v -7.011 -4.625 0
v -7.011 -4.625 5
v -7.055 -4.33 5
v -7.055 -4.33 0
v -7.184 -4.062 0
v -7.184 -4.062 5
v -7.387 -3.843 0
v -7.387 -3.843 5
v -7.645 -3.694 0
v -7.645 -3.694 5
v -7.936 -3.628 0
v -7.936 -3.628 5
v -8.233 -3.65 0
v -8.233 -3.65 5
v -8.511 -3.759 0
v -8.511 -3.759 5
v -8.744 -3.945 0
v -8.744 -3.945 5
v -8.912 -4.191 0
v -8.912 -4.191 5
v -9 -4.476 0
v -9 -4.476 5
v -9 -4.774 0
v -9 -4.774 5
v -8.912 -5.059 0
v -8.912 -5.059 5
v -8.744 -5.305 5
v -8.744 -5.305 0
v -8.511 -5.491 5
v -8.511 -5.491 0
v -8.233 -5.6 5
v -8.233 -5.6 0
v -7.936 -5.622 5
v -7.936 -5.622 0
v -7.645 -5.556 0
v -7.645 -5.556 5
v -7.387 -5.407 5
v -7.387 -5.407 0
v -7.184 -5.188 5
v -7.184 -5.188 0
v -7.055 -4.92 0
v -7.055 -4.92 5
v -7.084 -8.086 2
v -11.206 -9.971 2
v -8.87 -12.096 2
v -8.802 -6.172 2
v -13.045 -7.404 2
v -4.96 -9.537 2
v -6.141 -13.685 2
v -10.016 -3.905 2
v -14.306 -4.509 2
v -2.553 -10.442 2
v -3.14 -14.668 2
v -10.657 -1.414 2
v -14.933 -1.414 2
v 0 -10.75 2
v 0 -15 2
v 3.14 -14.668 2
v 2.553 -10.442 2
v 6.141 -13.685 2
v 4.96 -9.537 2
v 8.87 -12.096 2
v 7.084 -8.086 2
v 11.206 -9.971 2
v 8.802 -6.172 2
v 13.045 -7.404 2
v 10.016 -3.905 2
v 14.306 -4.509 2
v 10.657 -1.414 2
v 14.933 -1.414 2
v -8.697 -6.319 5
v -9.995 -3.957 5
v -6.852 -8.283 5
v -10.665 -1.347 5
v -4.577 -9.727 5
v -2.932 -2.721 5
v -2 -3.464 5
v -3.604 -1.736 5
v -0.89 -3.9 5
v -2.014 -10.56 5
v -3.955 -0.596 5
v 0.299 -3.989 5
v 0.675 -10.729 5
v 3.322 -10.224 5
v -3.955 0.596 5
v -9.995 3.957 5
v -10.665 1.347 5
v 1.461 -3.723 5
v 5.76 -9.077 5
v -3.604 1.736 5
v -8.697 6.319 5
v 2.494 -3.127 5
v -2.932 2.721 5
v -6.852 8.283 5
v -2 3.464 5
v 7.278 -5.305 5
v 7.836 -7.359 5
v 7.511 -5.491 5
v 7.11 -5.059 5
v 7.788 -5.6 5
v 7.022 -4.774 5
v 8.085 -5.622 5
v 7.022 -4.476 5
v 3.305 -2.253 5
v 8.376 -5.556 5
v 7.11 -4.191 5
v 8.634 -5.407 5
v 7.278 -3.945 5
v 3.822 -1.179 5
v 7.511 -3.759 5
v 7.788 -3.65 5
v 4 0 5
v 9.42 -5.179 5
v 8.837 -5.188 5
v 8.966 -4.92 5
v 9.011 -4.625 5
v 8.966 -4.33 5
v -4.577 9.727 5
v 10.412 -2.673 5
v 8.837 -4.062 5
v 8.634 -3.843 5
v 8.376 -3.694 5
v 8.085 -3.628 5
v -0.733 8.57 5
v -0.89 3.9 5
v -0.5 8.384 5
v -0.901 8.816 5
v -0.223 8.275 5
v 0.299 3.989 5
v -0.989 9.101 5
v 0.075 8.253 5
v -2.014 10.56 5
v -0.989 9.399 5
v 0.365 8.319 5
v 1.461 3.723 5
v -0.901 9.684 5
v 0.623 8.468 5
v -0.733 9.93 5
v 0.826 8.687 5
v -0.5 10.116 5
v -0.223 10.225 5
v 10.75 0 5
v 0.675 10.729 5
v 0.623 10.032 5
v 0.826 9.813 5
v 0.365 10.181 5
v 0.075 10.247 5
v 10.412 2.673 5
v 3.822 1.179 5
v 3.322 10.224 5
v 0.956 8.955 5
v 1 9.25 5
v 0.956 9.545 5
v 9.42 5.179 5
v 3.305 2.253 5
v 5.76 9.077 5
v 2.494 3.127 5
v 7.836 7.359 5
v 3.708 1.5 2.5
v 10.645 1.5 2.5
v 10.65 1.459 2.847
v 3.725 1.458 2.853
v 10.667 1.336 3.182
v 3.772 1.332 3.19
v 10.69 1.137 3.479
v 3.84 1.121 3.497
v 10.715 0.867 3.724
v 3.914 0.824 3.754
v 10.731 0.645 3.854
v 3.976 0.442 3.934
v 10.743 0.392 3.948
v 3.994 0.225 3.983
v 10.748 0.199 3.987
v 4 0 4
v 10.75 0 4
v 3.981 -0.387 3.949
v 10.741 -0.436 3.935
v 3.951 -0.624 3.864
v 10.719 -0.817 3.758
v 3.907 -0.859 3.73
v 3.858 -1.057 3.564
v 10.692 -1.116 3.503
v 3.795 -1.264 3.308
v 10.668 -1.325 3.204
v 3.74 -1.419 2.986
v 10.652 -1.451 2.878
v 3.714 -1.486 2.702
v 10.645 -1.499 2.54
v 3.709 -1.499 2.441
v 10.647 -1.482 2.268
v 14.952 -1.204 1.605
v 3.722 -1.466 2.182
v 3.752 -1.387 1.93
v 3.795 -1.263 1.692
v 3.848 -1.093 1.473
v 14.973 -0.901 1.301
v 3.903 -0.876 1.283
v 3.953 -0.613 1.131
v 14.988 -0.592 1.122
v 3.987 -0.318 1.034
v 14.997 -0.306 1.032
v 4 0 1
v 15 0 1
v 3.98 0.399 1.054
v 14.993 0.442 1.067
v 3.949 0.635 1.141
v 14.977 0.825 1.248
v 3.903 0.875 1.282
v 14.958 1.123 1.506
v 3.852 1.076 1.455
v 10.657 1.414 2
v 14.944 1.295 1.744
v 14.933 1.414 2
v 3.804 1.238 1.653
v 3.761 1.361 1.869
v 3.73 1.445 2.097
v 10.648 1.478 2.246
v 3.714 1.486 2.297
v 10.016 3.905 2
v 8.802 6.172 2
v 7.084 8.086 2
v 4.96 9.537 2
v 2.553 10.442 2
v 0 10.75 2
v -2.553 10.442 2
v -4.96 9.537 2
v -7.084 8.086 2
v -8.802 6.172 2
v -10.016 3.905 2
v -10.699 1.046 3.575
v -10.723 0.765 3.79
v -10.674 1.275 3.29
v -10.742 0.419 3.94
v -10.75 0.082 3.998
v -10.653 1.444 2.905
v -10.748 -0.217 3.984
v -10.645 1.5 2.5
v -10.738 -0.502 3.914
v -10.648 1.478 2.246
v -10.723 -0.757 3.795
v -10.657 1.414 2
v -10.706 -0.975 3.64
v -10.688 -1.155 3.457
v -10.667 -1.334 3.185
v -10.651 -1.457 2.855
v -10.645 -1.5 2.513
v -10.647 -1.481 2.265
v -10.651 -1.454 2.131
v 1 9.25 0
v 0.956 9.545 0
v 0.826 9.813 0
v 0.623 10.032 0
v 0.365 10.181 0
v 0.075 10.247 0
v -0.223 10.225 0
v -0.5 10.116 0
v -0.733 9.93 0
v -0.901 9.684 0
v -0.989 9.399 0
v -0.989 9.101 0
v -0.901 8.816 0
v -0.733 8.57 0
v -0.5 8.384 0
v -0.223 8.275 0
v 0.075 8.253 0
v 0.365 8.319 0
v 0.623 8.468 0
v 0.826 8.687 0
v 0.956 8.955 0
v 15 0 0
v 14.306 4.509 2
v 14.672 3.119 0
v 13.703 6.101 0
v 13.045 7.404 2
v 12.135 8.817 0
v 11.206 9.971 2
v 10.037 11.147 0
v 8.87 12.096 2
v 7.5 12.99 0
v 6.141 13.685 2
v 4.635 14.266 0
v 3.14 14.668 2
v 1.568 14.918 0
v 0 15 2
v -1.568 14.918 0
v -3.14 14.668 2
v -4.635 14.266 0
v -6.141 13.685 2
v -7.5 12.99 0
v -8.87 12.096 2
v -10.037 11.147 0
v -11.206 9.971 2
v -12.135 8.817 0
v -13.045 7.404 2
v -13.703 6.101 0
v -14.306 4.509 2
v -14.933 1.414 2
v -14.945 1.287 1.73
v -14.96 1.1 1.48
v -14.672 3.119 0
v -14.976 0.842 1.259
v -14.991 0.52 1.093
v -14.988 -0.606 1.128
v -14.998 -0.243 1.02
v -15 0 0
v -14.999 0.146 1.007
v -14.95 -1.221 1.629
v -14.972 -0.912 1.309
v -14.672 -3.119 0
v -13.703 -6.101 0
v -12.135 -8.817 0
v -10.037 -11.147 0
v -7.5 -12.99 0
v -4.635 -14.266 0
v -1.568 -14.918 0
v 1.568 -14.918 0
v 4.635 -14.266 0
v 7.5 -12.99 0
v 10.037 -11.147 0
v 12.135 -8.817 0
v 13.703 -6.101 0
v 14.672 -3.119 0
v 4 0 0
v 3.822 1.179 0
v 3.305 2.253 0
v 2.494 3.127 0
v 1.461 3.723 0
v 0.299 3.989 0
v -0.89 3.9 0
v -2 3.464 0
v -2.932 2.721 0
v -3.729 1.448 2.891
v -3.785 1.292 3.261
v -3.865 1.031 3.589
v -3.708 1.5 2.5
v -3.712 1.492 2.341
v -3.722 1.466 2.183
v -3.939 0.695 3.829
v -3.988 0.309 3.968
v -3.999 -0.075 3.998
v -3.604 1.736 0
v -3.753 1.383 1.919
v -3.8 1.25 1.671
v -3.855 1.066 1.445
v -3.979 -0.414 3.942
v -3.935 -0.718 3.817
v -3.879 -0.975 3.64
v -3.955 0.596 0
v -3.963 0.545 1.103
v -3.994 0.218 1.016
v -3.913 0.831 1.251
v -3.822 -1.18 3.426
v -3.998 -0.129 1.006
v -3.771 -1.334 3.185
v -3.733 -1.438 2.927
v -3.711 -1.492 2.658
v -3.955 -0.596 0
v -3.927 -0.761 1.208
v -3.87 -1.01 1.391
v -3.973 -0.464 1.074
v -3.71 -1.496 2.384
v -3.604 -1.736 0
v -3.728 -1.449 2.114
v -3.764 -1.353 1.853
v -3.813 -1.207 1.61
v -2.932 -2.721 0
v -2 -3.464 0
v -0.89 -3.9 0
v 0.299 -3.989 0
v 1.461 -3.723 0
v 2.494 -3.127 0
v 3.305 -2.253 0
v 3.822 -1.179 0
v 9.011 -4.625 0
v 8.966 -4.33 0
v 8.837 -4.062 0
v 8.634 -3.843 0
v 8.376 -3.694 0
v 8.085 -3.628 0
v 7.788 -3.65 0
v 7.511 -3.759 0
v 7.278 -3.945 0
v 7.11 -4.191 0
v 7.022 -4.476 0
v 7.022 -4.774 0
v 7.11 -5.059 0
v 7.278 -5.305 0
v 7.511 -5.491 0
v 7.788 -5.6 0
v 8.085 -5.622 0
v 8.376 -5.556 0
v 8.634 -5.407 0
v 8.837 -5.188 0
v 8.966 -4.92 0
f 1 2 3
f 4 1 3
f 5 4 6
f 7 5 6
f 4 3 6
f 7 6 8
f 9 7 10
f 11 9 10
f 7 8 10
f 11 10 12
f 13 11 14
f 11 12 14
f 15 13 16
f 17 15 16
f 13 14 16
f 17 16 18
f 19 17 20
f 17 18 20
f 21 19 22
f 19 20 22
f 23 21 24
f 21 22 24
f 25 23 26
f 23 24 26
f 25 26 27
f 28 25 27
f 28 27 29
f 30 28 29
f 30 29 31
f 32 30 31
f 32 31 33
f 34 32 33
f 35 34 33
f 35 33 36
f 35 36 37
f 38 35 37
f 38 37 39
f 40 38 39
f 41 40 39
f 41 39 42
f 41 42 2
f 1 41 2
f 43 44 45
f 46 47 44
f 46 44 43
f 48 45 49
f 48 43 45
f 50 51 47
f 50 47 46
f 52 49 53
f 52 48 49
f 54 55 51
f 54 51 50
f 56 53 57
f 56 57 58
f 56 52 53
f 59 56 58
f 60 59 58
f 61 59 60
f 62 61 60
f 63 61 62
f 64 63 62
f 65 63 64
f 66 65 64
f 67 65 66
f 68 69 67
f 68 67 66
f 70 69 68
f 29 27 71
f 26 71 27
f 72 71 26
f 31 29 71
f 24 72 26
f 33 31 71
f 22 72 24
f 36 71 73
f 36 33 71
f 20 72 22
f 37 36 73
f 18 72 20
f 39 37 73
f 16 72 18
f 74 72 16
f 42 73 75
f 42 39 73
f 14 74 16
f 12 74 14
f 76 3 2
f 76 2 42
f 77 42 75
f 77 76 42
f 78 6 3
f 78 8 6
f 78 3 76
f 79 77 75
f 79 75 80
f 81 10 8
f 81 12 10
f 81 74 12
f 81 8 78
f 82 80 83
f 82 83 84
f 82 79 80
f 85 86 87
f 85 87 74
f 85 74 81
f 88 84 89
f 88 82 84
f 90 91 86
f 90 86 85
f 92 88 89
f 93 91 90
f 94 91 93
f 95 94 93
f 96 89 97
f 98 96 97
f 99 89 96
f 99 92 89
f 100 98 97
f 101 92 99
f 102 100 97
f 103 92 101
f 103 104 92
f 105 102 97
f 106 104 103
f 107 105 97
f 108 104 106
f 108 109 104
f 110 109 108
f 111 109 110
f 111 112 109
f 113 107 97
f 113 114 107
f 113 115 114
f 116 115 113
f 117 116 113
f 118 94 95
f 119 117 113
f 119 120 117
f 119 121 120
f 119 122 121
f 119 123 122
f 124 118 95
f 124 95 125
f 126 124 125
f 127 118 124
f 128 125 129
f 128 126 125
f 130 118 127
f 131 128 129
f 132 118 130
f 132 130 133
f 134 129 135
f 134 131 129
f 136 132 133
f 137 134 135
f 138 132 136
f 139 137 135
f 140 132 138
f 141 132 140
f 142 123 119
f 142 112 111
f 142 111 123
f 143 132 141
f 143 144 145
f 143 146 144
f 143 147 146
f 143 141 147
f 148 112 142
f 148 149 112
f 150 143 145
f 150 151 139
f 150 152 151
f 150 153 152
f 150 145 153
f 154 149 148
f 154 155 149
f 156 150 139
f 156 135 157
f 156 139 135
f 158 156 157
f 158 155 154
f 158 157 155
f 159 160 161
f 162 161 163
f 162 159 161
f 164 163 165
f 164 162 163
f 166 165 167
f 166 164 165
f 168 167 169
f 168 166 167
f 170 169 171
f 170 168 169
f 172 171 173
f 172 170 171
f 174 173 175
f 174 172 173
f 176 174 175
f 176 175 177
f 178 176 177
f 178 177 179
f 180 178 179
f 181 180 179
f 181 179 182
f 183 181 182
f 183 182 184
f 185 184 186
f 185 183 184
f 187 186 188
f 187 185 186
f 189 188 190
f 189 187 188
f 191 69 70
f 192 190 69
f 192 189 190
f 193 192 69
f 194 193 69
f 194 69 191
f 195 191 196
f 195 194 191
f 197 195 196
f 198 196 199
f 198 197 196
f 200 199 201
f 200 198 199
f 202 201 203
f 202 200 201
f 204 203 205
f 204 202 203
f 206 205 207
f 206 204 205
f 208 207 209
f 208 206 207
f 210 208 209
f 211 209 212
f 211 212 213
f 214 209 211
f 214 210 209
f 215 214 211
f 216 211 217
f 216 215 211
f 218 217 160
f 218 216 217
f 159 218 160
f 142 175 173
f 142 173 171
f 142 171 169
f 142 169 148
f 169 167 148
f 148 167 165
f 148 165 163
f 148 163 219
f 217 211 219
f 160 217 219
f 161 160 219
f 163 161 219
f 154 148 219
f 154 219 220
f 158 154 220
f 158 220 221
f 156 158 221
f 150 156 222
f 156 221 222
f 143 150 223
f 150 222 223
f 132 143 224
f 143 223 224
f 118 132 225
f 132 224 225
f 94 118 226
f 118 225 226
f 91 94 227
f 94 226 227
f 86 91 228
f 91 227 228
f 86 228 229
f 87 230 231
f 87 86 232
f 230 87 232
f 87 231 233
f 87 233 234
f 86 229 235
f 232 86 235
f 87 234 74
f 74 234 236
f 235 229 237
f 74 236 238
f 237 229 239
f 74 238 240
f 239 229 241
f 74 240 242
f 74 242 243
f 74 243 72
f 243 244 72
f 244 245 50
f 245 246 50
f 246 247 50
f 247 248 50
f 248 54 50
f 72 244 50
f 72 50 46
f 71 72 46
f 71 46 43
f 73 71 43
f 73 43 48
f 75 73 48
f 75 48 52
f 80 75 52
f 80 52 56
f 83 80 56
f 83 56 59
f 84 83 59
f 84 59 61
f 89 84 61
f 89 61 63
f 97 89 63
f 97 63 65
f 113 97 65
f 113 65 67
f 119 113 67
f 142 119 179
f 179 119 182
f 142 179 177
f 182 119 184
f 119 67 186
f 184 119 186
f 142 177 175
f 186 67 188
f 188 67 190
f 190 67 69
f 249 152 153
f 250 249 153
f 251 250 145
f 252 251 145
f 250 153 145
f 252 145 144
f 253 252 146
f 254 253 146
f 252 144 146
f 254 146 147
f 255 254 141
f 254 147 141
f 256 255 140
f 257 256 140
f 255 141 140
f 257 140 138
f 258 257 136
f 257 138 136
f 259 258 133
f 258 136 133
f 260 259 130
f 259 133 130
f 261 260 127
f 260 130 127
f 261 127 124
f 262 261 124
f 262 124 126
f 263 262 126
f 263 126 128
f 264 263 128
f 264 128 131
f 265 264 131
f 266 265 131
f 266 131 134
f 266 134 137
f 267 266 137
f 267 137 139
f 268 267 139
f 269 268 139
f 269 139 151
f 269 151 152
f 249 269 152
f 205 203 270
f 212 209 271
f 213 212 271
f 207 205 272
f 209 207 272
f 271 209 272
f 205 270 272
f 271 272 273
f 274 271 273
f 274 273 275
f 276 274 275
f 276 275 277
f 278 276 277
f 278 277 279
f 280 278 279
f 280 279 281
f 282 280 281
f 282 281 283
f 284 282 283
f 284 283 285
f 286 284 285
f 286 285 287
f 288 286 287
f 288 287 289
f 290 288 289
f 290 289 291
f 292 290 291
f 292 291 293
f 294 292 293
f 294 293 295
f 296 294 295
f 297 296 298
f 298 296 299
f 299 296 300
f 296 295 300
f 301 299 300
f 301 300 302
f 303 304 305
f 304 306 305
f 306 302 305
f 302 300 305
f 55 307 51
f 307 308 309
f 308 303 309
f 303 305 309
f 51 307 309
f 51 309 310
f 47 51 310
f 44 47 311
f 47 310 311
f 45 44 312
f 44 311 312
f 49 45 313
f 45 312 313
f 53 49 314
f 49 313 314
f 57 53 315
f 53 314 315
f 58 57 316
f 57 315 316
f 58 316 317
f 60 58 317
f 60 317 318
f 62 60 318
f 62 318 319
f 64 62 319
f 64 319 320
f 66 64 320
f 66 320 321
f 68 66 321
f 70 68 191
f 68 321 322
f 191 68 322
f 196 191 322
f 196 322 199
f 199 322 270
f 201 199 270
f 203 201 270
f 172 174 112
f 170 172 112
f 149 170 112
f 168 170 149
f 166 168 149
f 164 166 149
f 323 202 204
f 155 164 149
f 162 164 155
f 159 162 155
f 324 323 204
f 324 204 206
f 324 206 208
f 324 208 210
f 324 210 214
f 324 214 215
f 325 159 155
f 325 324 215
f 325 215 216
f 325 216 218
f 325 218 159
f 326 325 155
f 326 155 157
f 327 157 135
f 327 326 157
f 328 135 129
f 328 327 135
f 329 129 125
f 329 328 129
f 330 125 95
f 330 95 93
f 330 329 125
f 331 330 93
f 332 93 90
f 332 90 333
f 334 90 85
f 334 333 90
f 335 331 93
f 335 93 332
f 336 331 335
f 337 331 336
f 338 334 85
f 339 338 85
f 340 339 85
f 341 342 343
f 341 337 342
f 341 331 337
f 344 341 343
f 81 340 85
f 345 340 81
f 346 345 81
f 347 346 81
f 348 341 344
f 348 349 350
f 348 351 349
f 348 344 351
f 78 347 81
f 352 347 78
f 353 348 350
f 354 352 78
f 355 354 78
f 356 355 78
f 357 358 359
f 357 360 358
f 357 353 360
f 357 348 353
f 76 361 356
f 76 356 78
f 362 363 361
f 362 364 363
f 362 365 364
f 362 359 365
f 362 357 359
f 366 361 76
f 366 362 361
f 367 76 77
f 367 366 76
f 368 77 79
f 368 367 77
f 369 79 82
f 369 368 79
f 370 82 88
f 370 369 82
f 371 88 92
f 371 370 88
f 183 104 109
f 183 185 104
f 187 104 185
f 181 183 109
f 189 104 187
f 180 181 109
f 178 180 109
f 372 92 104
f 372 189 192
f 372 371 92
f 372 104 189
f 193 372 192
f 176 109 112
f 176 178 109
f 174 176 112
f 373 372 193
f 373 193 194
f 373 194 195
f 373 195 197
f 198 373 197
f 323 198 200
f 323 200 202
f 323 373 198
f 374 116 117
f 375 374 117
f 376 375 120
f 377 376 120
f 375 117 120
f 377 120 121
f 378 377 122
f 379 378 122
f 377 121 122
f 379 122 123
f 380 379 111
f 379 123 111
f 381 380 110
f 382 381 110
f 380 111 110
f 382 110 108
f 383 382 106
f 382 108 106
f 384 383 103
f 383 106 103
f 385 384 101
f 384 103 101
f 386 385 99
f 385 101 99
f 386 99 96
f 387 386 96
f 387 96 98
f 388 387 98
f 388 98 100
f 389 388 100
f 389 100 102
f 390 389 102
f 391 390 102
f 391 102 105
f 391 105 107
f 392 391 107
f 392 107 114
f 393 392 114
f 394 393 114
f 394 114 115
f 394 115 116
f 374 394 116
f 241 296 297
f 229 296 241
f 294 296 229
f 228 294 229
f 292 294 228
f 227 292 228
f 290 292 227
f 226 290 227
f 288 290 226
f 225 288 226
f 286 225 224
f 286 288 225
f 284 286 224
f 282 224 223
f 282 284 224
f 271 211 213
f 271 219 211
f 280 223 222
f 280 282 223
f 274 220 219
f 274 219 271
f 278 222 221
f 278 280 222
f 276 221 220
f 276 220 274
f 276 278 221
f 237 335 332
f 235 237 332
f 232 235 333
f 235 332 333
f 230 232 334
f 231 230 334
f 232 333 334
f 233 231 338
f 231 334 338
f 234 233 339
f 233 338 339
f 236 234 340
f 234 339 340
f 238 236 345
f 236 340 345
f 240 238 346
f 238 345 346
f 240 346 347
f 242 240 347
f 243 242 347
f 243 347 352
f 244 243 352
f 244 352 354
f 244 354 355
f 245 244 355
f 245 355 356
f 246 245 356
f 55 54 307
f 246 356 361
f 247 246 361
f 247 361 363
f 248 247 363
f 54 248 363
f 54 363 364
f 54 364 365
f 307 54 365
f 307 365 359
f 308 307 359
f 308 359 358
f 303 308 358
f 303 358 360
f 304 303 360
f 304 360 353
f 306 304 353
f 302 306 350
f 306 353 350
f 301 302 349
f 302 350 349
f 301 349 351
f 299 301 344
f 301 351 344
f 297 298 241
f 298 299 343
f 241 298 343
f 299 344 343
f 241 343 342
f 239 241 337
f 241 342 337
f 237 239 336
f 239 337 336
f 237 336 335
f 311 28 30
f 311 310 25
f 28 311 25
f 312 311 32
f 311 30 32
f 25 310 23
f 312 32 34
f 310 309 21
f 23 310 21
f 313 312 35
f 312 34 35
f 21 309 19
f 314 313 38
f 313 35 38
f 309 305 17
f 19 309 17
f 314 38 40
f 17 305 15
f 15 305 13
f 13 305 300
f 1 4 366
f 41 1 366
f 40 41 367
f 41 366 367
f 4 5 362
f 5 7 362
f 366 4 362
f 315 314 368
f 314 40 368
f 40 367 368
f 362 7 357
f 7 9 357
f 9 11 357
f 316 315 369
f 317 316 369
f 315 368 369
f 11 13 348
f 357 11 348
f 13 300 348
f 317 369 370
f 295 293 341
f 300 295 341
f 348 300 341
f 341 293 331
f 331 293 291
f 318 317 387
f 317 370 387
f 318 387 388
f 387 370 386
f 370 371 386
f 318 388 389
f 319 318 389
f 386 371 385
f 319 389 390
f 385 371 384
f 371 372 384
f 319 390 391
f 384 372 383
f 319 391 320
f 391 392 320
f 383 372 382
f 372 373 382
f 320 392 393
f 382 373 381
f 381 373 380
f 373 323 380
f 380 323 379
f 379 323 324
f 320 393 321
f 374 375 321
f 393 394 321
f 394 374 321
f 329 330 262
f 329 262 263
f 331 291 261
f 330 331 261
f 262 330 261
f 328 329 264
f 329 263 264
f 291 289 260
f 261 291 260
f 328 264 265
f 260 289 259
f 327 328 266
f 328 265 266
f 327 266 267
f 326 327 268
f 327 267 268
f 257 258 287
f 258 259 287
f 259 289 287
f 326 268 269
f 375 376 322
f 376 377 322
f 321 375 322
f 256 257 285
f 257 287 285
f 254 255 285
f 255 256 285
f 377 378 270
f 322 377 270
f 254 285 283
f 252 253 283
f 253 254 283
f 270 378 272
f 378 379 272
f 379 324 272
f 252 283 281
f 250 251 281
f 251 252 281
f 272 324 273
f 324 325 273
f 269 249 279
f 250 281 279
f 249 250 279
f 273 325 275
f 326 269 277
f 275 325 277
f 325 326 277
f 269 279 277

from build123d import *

# Parameters (mm, degrees)
F0_R          = 15
F0_R_2        = 4
F1_DEPTH      = 2
F2_R          = 10.75
F2_R_2        = 4
F3_DEPTH      = 3
F4_R          = 1.5
F5_DEPTH      = 25
F5_DEPTH_BACK = 25
F6_R          = 1
F7_DEPTH      = 25


with BuildPart() as f1:
    # F0 (on Top) → F1 (new body)
    with BuildSketch(Plane.XY):
        Circle(F0_R)
        Circle(F0_R_2, mode=Mode.SUBTRACT)
    extrude(amount=F1_DEPTH)

    # F2 (on face) → F3 (join)
    with BuildSketch(Plane.XY.offset(2)):
        Circle(F2_R)
        Circle(F2_R_2, mode=Mode.SUBTRACT)
    extrude(amount=F3_DEPTH)

    # F4 (on Right) → F5 (cut, two sides)
    with BuildSketch(Plane.YZ) as f5_sk:
        with Locations((0, 2.5)):
            Circle(F4_R)
    extrude(amount=-F5_DEPTH, mode=Mode.SUBTRACT)
    extrude(f5_sk.sketch, amount=F5_DEPTH_BACK, mode=Mode.SUBTRACT)

    # F6 (on face) → F7 (cut)
    with BuildSketch(Plane.XY.offset(5)):
        with Locations((8.0107347155, -4.6250004669)):
            Circle(F6_R)
        with Locations((0, 9.25)):
            Circle(F6_R)
        with Locations((-8.0107355241, -4.6249990662)):
            Circle(F6_R)
    extrude(amount=-F7_DEPTH, mode=Mode.SUBTRACT)


solid = f1.part
